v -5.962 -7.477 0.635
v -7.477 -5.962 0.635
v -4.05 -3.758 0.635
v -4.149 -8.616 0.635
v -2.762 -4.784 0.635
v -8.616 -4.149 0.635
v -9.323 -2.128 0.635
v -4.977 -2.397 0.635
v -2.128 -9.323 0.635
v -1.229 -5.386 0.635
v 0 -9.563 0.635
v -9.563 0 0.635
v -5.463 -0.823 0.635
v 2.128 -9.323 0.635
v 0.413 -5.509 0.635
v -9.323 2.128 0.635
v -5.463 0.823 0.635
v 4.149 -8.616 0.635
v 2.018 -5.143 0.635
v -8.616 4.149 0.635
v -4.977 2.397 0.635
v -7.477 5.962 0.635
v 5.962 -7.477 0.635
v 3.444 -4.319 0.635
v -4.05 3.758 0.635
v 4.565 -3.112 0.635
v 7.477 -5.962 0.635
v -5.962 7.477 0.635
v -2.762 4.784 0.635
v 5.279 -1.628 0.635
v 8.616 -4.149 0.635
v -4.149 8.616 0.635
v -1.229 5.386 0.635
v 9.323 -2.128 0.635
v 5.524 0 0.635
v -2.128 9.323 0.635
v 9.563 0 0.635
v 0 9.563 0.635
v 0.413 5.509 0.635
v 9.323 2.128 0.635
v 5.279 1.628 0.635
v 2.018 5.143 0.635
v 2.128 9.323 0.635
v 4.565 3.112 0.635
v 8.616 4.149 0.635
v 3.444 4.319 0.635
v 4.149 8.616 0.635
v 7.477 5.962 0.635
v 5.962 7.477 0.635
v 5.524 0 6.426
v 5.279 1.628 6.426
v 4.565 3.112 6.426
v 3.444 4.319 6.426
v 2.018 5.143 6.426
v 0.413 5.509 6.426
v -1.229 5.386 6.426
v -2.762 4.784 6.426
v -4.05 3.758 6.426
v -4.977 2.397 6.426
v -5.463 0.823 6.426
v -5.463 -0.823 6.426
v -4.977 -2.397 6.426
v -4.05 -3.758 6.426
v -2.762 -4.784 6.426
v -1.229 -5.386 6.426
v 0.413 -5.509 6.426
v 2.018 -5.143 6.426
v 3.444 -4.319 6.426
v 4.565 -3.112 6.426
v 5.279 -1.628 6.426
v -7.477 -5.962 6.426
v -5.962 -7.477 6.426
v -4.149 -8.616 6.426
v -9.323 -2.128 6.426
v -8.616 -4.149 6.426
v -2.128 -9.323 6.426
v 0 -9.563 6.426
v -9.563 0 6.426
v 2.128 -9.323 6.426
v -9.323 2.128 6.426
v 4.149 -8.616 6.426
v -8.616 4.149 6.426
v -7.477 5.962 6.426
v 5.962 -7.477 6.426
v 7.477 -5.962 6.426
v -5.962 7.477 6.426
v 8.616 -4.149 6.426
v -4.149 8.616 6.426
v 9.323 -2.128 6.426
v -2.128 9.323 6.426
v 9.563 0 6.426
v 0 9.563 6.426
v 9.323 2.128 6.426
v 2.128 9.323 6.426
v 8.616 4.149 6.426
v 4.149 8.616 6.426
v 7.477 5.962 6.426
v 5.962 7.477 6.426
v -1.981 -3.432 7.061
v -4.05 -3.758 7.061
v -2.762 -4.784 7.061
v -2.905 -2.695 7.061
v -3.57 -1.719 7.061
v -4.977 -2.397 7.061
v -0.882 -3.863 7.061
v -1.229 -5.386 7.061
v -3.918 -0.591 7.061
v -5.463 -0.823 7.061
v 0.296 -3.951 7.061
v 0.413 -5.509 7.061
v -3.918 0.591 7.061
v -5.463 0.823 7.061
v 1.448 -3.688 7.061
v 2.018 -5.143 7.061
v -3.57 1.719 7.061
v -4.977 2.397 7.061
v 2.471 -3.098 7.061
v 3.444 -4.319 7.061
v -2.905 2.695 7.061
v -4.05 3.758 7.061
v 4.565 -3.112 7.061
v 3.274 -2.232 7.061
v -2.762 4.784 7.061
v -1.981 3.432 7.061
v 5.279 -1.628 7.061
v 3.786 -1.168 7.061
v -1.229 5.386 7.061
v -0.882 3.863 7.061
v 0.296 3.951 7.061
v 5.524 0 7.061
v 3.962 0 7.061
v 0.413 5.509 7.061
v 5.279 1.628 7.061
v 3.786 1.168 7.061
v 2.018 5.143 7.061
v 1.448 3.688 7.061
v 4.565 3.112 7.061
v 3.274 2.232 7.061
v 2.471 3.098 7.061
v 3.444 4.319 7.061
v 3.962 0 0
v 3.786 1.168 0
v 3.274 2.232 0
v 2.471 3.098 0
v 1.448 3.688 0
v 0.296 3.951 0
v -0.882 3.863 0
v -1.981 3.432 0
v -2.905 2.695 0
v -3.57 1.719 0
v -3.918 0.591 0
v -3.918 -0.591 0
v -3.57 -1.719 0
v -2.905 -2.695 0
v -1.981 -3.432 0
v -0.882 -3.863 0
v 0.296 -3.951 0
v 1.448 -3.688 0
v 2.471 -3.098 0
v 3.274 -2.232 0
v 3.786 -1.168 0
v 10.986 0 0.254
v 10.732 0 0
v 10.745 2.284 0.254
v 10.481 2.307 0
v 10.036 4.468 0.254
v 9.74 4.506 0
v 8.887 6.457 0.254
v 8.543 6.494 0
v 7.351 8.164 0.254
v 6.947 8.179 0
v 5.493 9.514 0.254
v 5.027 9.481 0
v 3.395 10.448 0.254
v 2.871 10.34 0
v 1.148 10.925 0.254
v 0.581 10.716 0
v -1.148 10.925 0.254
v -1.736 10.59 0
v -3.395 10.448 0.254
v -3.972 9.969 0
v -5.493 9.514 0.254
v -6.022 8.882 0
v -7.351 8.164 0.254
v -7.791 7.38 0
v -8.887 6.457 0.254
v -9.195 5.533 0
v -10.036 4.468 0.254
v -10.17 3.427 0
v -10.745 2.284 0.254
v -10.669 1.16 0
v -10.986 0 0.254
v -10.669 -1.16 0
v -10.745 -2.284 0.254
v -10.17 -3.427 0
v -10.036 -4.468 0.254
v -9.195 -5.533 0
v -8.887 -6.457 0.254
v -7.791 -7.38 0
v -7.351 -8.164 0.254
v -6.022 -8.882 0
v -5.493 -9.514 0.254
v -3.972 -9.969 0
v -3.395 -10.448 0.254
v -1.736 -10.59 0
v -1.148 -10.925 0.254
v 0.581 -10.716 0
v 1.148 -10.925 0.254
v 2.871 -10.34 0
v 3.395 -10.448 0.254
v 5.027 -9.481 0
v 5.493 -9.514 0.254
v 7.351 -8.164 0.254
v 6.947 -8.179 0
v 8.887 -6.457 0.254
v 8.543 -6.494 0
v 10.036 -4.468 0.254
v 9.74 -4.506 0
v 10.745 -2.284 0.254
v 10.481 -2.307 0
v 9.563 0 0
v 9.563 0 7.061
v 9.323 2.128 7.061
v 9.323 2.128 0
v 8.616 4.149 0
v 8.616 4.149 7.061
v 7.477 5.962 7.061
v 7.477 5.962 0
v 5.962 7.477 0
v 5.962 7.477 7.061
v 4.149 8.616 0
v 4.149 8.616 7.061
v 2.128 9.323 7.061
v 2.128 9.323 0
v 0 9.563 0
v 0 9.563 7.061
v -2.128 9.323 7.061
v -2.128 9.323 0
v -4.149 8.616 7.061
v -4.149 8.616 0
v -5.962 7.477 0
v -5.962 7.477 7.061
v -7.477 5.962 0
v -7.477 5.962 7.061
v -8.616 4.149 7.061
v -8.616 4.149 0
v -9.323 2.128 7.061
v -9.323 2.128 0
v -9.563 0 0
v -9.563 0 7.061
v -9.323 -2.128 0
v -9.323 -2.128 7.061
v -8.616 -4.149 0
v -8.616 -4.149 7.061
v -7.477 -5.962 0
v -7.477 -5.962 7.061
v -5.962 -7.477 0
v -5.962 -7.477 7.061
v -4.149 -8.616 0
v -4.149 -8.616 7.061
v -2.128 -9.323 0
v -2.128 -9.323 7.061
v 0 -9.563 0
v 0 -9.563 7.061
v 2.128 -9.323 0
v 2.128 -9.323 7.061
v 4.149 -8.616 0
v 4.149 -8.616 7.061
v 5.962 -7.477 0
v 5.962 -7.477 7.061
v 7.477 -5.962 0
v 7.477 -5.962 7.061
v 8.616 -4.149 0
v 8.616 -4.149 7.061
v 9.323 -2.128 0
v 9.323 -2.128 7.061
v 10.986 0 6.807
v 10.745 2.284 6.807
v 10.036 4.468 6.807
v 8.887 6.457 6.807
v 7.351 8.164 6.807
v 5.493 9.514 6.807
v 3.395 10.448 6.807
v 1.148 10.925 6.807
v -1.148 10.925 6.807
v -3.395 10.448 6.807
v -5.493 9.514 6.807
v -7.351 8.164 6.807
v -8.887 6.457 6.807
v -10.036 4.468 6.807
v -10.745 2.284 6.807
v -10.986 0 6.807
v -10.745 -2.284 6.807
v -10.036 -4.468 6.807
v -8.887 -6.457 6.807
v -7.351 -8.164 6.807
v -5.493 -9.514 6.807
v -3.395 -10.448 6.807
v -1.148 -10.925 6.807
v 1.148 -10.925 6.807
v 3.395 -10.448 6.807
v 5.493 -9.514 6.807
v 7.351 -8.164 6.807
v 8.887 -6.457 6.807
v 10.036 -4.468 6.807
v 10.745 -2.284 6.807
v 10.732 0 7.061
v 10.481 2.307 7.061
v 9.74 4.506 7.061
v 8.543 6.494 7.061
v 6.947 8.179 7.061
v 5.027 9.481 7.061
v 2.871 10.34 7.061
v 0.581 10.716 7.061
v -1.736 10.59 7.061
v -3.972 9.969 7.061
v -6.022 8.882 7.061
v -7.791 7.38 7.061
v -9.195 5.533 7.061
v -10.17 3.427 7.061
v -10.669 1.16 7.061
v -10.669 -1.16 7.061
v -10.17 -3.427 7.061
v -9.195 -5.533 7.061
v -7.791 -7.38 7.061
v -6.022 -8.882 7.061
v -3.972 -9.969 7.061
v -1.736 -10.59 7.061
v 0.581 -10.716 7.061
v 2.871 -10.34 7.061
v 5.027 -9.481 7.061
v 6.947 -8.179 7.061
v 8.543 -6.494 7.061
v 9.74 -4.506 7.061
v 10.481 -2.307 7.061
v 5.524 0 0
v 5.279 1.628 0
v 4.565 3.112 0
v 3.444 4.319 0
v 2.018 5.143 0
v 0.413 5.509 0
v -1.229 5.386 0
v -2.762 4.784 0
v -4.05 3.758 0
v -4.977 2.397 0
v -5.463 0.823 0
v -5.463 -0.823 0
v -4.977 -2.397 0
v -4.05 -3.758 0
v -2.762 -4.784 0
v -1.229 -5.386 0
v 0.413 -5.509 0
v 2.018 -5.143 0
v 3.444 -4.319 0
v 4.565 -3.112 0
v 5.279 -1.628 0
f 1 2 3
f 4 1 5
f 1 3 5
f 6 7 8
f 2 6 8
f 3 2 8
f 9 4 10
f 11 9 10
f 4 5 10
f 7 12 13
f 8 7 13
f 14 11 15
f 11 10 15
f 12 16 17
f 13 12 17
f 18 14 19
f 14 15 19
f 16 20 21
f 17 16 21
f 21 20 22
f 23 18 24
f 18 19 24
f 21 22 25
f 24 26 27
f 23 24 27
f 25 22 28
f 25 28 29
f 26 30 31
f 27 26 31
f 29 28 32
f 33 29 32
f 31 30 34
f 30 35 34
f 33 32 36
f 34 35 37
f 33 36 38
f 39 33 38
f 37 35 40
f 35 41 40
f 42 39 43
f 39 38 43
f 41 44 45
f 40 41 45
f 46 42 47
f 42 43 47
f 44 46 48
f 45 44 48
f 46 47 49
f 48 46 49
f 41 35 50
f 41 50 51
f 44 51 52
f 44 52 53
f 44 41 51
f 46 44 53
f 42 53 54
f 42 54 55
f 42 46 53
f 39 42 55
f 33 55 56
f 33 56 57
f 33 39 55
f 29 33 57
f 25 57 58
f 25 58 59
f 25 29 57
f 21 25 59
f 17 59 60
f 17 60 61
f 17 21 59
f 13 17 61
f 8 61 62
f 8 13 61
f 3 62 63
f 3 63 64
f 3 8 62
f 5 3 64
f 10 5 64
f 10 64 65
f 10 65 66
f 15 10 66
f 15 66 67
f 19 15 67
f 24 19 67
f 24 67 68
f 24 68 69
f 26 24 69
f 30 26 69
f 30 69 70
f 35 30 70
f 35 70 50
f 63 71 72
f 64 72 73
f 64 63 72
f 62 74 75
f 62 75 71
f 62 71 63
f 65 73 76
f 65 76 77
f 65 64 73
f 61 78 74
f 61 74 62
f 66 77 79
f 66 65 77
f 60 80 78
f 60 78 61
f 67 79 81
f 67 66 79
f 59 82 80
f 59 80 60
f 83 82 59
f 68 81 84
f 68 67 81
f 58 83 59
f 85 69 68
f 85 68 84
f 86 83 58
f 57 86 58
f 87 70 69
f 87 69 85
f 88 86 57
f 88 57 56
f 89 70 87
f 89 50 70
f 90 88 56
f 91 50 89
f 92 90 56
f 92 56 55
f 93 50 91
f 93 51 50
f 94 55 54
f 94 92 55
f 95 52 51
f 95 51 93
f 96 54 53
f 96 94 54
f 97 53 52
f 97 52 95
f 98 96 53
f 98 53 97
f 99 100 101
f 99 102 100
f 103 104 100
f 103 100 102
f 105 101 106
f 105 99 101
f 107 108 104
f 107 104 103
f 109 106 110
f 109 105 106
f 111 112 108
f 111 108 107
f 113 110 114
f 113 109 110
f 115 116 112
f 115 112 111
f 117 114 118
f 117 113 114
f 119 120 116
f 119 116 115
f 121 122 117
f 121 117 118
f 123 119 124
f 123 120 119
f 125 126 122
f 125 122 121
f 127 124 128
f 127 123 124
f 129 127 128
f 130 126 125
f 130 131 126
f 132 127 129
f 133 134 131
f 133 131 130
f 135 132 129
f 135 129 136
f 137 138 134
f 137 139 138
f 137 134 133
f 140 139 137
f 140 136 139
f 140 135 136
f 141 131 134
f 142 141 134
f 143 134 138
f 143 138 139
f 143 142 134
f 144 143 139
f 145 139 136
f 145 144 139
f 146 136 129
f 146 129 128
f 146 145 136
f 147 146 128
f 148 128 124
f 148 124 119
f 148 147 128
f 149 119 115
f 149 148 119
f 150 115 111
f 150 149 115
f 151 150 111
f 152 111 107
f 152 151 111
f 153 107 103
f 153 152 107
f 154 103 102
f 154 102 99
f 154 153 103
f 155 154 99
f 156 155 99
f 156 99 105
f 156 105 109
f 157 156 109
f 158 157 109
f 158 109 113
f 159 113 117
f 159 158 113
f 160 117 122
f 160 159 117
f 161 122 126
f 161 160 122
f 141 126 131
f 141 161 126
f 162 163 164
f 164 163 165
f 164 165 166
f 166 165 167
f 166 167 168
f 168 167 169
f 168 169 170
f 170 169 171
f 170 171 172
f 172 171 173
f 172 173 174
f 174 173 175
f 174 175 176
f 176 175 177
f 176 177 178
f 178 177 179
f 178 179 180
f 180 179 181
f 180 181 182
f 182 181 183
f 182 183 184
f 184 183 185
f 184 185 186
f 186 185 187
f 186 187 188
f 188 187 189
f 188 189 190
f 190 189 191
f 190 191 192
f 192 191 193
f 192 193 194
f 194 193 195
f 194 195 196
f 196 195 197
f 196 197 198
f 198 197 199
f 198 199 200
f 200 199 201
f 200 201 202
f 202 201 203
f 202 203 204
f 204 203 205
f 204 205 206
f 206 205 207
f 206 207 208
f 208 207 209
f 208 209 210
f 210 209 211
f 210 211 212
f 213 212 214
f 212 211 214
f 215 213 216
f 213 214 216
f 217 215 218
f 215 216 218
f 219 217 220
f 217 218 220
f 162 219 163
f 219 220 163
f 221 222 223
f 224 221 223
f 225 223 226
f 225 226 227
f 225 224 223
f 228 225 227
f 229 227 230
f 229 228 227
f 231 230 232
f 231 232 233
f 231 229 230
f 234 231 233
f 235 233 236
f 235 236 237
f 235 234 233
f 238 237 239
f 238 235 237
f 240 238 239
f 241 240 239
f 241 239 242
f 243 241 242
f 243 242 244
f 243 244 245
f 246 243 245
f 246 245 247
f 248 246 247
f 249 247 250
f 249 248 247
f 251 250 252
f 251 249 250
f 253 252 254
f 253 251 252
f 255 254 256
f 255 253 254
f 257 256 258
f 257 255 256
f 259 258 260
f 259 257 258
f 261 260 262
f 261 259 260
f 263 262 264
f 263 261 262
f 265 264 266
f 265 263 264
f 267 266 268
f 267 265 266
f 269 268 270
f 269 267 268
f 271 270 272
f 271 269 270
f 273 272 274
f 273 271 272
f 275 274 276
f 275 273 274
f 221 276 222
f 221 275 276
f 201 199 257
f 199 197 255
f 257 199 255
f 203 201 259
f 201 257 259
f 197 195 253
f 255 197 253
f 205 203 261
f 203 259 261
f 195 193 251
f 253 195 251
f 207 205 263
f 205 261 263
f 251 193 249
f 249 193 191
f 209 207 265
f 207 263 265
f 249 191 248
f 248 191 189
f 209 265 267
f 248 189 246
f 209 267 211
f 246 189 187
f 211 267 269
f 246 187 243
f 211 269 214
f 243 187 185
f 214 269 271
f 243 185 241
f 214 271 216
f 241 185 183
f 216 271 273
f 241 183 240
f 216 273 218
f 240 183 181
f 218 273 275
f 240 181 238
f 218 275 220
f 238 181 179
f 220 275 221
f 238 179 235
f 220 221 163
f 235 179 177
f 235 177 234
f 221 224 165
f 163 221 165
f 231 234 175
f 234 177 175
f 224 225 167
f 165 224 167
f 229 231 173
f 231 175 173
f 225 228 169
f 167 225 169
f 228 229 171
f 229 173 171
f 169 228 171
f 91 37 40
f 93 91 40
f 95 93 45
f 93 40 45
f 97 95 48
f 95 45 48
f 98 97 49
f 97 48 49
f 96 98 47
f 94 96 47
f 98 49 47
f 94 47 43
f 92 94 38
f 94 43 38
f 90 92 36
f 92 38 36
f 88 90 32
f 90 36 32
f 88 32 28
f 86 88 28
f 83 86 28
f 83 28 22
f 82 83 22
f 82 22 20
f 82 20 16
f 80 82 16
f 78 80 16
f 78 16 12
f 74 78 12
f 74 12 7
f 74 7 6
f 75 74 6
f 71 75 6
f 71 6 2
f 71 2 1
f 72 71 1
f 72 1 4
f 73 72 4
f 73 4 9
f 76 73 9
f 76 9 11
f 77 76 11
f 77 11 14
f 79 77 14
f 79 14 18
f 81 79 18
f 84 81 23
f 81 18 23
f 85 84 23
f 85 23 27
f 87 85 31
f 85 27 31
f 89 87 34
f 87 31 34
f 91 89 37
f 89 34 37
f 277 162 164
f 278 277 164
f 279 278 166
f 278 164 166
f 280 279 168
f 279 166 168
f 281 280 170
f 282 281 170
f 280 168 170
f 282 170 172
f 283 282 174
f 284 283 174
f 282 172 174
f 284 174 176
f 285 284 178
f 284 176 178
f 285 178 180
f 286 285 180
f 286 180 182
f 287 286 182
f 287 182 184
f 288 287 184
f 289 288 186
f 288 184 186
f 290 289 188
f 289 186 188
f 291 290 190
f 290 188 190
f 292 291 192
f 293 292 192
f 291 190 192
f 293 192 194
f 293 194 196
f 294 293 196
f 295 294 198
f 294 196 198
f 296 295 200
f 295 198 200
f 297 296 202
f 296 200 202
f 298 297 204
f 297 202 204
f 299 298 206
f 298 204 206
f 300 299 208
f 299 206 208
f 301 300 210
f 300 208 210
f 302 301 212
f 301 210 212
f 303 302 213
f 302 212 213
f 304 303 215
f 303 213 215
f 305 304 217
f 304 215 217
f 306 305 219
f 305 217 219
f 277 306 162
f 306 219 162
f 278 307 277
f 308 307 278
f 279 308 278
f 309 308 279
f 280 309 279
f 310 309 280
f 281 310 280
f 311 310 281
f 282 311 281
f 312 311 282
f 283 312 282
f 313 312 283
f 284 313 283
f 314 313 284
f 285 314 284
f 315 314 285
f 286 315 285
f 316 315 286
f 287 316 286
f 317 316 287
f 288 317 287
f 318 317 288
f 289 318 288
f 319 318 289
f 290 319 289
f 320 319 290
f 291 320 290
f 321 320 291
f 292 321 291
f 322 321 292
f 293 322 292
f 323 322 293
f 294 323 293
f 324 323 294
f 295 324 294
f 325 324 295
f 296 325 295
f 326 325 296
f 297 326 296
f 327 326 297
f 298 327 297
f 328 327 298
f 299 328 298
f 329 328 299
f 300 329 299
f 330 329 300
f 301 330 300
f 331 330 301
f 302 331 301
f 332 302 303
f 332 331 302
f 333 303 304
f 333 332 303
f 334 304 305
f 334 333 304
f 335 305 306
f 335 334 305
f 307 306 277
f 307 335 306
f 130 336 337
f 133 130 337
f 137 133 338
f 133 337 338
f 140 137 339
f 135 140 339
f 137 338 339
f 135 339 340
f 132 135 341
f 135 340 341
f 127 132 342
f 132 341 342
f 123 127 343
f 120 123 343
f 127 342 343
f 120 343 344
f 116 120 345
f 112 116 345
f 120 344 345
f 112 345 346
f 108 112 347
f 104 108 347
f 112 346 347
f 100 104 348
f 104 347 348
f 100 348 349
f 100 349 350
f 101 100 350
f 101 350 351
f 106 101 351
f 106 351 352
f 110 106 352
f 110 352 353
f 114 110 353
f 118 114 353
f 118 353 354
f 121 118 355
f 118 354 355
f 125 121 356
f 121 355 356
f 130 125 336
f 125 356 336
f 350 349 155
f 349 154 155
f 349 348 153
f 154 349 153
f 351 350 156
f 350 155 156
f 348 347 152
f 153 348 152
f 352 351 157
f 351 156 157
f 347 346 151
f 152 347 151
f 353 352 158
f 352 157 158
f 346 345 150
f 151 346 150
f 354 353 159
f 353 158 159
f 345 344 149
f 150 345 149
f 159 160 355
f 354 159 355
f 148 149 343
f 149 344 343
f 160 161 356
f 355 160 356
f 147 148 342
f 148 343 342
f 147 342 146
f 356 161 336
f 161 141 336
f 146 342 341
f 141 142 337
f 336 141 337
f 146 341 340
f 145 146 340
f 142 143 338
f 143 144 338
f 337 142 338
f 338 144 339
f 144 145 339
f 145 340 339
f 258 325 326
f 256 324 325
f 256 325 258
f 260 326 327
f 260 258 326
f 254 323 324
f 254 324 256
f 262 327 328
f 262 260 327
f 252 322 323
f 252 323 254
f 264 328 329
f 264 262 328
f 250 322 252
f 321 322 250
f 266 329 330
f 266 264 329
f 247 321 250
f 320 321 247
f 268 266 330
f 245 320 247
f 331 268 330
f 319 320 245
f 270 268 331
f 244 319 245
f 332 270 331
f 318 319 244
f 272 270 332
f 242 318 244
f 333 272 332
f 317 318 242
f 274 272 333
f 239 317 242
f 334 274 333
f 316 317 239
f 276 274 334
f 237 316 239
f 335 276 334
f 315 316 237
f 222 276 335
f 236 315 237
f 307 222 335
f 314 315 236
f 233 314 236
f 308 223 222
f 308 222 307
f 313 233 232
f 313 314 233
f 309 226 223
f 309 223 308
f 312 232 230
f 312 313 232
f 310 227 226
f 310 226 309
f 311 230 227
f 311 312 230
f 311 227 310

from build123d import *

# Parameters (mm, degrees)
F0_R     = 10.9855
F0_R_2   = 9.5631
F1_DEPTH = 7.0612
F0_R_3   = 5.5245
F0_R_4   = 3.9624
F3_DEPTH = 7.0612
F4_DEPTH = 0.635
F5_DEPTH = 25.4
F6_SIZE  = 0.254


# Not quite as in the source:
# - a pattern or mirror of a feature is missing from the dataset's text; its kind, count and spacing are read off the source's solid


with BuildPart() as f1:
    # F0 (on Top) → F1 (new body)
    with BuildSketch(Plane.XY):
        Circle(F0_R)
        Circle(F0_R_2, mode=Mode.SUBTRACT)
    extrude(amount=F1_DEPTH)

    # F0 (on Top) → F5 (cut)
    with BuildSketch(Plane.XY):
        Circle(F0_R_4)
    extrude(amount=F5_DEPTH, mode=Mode.SUBTRACT)

    # F6
    f6_edges = [f1.edges().sort_by_distance(p)[0] for p in [
        (10.9855, 0, 3.5306),
        (-10.9855, 0, 0),
        (-10.9855, 0, 7.0612),
    ]]
    chamfer(f6_edges, length=F6_SIZE)


with BuildPart() as f1b:
    # F0 (on Top) → F1, piece 2 (new body)
    with BuildSketch(Plane.XY):
        Circle(F0_R_3)
        Circle(F0_R_4, mode=Mode.SUBTRACT)
    extrude(amount=F1_DEPTH)


with BuildPart() as f3:
    # F0 (on Top) → F3 (new body, through all)
    with BuildSketch(Plane.XY):
        Circle(F0_R_2)
        Circle(F0_R_3, mode=Mode.SUBTRACT)
    extrude(amount=F3_DEPTH)

    # F0 (on Top) → F4 (cut)
    with BuildSketch(Plane.XY):
        Circle(F0_R_2)
        Circle(F0_R_3, mode=Mode.SUBTRACT)
    f4 = extrude(amount=F4_DEPTH, mode=Mode.SUBTRACT)

    # F4_copies: F4 across plane
    add(f4.mirror(Plane.XY.offset(3.5306)), mode=Mode.SUBTRACT)


solid = Compound([f1.part, f1b.part, f3.part])
